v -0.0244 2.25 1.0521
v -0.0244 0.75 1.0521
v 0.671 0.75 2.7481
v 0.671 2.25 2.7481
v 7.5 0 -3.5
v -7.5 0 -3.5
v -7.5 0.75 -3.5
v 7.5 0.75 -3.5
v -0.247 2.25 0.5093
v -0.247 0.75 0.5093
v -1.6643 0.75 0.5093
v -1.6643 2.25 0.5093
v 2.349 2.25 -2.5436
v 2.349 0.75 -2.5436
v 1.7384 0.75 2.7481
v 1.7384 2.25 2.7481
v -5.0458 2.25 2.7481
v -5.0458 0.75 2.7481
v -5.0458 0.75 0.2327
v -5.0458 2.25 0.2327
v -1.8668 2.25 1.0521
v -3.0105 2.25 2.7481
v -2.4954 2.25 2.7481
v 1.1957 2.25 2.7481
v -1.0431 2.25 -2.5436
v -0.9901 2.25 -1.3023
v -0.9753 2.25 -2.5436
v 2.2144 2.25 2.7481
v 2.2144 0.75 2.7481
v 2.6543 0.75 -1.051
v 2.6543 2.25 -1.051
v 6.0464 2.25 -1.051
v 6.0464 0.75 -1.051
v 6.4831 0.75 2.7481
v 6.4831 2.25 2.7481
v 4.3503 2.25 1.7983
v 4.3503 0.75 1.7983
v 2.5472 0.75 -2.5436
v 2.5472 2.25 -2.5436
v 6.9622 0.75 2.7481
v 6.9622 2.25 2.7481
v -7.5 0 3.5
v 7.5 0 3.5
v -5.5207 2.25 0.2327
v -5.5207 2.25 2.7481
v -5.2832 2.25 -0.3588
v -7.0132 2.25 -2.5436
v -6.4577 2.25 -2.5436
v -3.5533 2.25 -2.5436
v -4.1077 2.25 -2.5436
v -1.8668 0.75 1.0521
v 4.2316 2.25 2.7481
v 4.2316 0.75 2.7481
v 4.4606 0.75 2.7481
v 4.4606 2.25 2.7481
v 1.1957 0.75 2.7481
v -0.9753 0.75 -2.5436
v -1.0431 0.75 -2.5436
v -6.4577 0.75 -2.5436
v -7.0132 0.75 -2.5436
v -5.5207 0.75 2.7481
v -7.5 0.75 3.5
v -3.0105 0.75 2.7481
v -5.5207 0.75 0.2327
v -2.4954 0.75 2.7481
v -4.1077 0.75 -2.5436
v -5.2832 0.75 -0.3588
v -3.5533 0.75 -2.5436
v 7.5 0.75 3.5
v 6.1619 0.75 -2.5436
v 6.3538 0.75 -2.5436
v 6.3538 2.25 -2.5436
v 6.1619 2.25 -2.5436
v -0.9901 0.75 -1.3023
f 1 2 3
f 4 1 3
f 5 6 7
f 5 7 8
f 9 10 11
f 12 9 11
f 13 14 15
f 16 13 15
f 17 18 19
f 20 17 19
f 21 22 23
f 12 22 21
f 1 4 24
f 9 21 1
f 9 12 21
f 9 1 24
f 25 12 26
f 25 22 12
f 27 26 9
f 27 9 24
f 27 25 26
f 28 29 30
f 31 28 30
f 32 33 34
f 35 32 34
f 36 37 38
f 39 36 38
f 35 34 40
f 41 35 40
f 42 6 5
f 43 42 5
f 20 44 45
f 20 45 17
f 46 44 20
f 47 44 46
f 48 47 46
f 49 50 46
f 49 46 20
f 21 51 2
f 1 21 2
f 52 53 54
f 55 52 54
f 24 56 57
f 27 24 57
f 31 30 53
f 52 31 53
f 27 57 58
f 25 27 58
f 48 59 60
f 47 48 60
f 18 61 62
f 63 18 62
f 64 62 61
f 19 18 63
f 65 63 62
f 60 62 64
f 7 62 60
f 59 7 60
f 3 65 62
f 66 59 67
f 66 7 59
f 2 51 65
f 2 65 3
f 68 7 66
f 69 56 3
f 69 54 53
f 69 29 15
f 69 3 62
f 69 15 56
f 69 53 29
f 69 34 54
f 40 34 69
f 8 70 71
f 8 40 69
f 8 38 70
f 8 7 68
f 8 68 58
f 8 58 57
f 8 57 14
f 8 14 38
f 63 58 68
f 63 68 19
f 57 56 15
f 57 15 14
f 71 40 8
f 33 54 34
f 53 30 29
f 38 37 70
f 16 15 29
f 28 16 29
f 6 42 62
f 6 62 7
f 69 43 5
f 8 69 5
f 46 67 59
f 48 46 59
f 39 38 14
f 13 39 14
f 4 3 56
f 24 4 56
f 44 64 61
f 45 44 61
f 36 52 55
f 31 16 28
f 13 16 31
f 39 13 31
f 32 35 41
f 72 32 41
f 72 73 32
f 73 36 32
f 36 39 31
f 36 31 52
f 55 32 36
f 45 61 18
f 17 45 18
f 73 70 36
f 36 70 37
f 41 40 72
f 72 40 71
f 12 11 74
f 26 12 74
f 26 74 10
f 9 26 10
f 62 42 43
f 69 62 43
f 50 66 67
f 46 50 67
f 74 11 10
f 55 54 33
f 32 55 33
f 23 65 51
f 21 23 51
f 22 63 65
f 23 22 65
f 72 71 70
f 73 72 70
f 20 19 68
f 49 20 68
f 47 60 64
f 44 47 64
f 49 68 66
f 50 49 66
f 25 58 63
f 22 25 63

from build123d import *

# Parameters (mm, degrees)
SKETCH1_W           = 15
SKETCH1_H           = 7
BOSS_EXTRUDE1_DEPTH = 0.75
BOSS_EXTRUDE2_DEPTH = 1.5


with BuildPart() as part:
    # Sketch1 → Boss-Extrude1 (new body)
    with BuildSketch(Plane(origin=(0, 0, 0), x_dir=(1, 0, 0), z_dir=(0, 1, 0))):
        Rectangle(SKETCH1_W, SKETCH1_H)
    extrude(amount=BOSS_EXTRUDE1_DEPTH)

    # Sketch2 → Boss-Extrude2 (add)
    with BuildSketch(Plane(origin=(0, 0.75, 0), x_dir=(1, 0, 0), z_dir=(0, 1, 0))):
        Polygon((6.962231563, -2.748114094), (6.353774698, 2.543552573), (6.161909381, 2.543552573), (4.35031917, -1.798327769), (2.547209194, 2.543552573), (2.348983699, 2.543552573), (1.738406776, -2.748114094), (2.214359968, -2.748114094), (2.654272161, 1.051031205), (4.231595879, -2.748114094), (4.460562225, -2.748114094), (6.046366178, 1.051031205), (6.483098283, -2.748114094), align=None)
        Polygon((-1.043110318, 2.543552573), (-3.010524848, -2.748114094), (-2.495350569, -2.748114094), (-1.866753146, -1.052067085), (-0.024422083, -1.052067085), (0.67095719, -2.748114094), (1.195671734, -2.748114094), (-0.975268437, 2.543552573), align=None)
        Polygon((-0.990108849, 1.302258169), (-0.247028253, -0.509332042), (-1.664287535, -0.509332042), align=None, mode=Mode.SUBTRACT)
        Polygon((-3.55325989, 2.543552573), (-4.107655256, 2.543552573), (-5.283227839, 0.35883202), (-6.457740392, 2.543552573), (-7.013195788, 2.543552573), (-5.52067442, -0.232664374), (-5.52067442, -2.748114094), (-5.045781258, -2.748114094), (-5.045781258, -0.232664374), align=None)
    extrude(amount=BOSS_EXTRUDE2_DEPTH)


solid = part.part
